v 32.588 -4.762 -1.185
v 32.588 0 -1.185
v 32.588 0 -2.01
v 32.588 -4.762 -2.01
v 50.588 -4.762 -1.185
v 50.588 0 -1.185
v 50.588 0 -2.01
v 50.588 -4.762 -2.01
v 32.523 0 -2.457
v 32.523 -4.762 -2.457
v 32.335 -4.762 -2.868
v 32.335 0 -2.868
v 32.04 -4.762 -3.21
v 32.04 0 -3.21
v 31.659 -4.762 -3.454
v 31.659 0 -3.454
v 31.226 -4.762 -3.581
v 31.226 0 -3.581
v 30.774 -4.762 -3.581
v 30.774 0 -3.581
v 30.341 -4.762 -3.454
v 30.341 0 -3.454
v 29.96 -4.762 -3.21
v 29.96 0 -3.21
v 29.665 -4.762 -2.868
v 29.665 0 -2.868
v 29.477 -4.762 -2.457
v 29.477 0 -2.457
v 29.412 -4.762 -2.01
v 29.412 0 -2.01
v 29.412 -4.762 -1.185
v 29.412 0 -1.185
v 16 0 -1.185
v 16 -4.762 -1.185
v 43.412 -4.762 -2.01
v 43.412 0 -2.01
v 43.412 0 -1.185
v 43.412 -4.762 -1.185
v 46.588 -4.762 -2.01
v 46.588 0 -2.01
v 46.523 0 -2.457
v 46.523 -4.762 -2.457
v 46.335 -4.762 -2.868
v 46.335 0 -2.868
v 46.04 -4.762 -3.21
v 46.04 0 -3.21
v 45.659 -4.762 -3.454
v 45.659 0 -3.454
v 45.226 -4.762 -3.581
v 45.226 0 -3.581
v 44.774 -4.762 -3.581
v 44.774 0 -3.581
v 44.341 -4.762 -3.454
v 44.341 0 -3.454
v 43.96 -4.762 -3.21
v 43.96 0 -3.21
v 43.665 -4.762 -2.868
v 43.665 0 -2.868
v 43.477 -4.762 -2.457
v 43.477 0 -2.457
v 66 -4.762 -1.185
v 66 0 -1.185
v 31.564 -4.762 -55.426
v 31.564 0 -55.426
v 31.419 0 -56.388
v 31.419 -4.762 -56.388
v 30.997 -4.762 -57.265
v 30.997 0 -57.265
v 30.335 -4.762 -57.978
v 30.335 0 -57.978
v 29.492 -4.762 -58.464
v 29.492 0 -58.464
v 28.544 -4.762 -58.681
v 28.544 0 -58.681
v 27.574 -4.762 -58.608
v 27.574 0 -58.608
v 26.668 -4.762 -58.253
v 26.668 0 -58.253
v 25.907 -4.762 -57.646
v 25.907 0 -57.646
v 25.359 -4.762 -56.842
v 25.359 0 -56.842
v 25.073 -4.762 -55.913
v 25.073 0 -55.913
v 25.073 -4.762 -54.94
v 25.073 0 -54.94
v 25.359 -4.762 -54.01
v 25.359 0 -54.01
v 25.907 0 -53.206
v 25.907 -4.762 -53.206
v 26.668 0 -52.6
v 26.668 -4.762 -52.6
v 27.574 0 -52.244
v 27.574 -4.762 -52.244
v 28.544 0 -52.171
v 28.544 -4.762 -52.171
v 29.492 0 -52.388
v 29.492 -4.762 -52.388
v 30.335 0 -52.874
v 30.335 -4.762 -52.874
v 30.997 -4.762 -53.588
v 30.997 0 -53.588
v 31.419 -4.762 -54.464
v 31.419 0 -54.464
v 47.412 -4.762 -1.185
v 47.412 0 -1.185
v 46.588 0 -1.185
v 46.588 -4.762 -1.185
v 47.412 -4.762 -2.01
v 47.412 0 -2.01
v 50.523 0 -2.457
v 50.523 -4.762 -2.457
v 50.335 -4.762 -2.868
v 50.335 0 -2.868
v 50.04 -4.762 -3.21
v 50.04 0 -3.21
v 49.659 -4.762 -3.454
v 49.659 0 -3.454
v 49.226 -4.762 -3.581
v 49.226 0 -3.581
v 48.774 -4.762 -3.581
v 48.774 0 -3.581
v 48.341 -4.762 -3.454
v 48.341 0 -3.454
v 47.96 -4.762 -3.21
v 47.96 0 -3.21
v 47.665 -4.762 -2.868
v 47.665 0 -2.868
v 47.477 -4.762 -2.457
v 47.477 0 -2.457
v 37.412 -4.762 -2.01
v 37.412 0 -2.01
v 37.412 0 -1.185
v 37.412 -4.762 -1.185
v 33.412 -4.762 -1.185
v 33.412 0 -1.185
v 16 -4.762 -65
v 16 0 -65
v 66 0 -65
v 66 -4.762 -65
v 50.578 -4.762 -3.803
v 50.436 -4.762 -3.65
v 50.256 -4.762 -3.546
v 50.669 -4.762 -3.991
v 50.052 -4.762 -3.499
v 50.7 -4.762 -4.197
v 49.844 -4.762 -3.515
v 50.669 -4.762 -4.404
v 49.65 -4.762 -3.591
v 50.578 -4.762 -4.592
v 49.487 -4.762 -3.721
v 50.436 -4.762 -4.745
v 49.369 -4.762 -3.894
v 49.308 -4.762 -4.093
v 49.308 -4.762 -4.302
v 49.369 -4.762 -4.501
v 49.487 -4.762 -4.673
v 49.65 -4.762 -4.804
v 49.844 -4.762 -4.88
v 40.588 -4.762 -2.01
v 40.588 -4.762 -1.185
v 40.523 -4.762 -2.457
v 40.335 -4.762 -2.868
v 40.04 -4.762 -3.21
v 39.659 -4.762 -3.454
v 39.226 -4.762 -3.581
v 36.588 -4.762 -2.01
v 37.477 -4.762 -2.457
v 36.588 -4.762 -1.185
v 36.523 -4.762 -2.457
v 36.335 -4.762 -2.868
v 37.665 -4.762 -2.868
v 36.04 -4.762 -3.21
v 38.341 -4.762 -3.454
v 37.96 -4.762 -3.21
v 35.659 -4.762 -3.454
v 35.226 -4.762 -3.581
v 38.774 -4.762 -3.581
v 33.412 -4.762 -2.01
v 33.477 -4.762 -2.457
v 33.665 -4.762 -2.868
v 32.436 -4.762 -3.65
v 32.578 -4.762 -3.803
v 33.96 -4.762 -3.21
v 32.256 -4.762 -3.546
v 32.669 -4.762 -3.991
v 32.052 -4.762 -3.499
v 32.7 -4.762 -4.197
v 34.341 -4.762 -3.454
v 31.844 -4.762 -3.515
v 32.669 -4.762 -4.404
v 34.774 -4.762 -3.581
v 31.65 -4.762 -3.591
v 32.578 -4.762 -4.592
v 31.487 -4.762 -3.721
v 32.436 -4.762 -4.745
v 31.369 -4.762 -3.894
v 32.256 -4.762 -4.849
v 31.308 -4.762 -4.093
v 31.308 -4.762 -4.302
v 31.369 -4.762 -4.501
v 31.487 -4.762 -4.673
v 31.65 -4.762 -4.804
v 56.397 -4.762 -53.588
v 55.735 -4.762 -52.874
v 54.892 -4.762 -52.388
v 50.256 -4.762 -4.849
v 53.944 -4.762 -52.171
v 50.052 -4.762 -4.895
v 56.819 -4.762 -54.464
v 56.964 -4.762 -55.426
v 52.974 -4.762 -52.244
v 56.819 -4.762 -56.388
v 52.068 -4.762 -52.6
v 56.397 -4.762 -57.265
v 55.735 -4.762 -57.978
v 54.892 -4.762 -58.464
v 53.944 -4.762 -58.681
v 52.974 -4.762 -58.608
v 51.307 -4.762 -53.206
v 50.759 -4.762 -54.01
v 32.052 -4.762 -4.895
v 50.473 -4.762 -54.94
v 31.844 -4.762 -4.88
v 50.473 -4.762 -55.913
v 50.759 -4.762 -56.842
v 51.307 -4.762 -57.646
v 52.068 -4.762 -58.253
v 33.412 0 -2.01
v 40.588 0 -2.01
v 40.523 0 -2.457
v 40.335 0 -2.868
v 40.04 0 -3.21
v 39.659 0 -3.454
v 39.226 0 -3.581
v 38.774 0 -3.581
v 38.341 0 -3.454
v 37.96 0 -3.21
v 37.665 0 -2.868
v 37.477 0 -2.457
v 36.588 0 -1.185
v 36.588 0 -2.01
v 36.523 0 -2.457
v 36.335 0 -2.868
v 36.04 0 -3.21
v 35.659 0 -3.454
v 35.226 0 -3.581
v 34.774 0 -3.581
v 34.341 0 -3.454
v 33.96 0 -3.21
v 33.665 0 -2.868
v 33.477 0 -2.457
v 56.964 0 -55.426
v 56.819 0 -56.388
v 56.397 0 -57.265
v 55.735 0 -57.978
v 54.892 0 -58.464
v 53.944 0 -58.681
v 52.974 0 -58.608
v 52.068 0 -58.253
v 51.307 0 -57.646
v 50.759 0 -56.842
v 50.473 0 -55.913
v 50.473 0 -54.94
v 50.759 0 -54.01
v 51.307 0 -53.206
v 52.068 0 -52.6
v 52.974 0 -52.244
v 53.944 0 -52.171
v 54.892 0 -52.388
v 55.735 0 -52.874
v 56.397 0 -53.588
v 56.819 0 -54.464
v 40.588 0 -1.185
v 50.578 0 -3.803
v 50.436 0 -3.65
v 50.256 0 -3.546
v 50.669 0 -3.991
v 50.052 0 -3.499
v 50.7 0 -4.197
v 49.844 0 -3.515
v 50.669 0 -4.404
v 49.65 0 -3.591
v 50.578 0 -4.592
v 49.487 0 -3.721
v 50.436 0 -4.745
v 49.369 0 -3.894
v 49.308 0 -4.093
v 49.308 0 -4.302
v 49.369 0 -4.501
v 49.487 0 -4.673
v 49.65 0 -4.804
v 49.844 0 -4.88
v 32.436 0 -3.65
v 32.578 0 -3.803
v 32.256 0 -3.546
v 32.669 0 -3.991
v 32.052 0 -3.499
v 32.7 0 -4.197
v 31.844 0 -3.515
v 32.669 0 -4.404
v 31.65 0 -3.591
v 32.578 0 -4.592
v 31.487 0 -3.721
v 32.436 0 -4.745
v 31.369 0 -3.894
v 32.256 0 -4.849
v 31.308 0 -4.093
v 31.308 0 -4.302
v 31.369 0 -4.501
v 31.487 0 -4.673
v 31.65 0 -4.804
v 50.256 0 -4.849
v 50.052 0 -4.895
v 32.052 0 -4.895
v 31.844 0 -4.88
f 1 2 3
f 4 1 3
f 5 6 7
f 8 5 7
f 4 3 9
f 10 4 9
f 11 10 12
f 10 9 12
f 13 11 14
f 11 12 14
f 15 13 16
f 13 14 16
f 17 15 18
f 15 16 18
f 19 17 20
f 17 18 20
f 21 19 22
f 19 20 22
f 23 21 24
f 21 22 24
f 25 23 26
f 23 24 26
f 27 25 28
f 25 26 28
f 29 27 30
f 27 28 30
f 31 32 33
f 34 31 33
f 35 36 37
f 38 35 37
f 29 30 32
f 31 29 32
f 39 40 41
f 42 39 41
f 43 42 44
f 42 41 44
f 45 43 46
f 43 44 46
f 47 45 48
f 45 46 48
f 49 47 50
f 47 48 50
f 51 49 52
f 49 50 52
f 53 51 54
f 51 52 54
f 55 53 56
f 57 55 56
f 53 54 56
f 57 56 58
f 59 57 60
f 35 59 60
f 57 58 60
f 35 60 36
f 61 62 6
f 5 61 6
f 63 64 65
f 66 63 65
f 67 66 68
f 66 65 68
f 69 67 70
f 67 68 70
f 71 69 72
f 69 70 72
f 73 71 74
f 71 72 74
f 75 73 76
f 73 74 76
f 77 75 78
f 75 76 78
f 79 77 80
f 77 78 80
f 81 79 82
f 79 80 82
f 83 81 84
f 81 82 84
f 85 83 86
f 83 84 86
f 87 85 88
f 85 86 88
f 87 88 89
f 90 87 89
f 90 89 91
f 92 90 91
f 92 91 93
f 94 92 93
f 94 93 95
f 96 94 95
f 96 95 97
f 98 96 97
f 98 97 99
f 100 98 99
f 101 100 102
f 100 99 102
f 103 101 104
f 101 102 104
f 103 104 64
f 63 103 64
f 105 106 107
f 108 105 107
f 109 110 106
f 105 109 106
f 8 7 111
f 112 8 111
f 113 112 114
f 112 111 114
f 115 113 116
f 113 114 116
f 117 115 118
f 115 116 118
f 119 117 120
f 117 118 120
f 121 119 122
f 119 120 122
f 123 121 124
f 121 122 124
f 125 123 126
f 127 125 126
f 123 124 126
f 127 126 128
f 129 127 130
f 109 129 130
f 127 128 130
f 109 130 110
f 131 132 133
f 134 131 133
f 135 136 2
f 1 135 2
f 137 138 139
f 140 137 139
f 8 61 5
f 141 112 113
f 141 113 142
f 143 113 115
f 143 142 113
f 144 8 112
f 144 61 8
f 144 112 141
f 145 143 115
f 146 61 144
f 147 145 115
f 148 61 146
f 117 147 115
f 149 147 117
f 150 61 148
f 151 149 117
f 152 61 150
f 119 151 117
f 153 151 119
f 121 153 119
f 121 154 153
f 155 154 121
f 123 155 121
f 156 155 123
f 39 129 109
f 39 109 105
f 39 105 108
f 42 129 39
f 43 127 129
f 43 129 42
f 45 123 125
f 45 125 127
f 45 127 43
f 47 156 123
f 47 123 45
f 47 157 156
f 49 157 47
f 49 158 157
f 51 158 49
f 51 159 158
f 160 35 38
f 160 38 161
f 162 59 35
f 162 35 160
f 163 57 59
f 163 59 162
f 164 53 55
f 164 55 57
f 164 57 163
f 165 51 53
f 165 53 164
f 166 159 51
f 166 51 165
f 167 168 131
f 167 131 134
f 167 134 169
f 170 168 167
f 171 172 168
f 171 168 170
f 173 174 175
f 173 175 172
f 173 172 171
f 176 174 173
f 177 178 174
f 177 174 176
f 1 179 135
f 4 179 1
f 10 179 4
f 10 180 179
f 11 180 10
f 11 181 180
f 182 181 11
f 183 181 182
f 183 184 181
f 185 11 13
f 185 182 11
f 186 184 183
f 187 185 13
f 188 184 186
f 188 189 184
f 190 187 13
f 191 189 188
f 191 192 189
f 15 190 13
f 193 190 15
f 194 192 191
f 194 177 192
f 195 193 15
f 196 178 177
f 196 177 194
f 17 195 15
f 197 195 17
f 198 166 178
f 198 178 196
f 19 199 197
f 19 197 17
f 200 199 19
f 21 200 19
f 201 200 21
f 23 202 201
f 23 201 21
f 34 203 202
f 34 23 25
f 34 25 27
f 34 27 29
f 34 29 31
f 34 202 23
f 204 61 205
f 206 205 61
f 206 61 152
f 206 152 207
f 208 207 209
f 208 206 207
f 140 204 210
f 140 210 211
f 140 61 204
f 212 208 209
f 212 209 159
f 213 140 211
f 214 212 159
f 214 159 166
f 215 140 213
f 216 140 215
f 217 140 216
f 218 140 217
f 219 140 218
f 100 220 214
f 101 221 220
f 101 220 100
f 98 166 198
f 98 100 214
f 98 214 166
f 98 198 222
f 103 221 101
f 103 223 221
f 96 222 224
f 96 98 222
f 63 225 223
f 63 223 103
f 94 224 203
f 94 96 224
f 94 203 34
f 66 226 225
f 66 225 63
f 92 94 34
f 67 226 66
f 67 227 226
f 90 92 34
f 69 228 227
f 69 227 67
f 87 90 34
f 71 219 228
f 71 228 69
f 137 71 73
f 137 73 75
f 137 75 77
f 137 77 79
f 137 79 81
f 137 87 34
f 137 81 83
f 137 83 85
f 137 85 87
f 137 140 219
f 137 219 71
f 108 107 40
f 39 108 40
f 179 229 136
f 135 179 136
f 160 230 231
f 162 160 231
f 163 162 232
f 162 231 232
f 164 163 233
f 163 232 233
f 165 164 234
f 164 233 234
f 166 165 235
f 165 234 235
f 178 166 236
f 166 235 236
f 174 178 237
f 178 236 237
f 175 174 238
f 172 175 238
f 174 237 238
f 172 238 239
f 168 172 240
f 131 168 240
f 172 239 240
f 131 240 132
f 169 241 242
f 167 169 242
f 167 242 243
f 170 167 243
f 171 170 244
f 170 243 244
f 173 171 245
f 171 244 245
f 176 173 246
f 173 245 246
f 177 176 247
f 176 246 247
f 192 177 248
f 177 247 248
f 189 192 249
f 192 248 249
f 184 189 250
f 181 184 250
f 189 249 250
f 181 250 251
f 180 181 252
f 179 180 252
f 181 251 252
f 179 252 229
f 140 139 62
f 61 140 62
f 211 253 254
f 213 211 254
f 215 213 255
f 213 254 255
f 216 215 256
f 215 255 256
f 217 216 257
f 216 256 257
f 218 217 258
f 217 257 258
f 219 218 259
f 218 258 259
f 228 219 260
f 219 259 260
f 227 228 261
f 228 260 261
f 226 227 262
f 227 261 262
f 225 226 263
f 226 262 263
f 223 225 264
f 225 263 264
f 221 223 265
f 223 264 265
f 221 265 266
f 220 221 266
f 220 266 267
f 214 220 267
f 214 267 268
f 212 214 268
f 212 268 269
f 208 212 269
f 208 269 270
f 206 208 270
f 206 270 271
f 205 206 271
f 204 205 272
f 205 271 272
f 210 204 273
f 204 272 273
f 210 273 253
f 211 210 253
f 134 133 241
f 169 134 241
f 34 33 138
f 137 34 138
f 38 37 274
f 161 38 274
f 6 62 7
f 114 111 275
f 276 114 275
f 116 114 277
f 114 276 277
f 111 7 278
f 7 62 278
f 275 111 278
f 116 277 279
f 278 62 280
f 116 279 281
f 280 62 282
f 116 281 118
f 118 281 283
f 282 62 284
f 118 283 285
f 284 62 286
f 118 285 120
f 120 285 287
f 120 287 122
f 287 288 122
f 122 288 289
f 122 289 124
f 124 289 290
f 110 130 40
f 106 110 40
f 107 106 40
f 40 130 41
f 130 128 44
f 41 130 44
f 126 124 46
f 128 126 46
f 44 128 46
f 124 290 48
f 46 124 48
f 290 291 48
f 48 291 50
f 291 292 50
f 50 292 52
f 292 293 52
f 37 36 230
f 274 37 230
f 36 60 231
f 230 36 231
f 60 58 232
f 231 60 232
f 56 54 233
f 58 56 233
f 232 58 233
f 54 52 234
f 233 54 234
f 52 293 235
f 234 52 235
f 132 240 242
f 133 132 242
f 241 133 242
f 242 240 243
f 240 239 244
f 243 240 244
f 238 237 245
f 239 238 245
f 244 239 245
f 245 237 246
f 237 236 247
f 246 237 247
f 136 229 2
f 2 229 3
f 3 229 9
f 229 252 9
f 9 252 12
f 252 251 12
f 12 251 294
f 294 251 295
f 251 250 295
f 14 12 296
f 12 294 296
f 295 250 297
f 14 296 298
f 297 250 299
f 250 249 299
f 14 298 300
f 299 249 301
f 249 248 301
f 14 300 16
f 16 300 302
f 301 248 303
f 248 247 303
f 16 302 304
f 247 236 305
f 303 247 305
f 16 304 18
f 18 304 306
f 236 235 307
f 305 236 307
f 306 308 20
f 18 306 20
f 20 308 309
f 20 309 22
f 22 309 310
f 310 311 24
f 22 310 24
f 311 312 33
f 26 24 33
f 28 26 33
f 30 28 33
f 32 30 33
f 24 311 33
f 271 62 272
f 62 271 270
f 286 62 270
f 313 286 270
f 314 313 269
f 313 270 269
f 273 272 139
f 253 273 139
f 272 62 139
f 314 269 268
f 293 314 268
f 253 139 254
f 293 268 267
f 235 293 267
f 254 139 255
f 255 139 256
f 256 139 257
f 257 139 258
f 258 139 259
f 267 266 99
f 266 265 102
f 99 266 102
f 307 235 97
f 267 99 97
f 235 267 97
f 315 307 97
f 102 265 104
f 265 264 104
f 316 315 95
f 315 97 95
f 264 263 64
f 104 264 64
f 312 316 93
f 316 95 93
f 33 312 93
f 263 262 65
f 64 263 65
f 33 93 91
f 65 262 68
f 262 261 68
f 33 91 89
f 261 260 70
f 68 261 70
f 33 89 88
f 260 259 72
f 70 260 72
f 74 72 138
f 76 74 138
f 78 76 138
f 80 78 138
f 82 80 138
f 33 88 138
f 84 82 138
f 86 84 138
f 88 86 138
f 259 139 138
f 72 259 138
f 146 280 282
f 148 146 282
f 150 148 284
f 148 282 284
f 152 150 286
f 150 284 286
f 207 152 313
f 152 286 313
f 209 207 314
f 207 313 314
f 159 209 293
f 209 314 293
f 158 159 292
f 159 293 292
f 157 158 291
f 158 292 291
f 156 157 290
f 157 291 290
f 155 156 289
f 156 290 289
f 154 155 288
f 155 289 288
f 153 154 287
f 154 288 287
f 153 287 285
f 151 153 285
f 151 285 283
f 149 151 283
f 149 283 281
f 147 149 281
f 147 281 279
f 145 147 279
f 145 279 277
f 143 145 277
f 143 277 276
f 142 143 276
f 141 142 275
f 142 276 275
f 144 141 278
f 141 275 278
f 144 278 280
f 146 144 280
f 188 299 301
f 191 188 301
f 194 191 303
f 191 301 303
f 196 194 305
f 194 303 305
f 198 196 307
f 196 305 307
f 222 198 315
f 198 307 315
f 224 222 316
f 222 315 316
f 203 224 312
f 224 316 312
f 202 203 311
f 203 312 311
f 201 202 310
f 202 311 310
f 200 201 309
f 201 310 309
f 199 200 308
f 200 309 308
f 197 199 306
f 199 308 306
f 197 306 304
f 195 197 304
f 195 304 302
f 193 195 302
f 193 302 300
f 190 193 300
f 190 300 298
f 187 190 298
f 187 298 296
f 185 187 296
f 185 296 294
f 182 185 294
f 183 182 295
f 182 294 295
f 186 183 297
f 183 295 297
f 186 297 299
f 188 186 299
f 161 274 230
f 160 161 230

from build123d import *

# Parameters (mm, degrees)
SKETCH1_R           = 0.7
SKETCH1_R_2         = 3.2639
BOSS_EXTRUDE1_DEPTH = 4.7625


with BuildPart() as part:
    # Sketch1 → Boss-Extrude1 (new body)
    with BuildSketch(Plane(origin=(0, 0, 0), x_dir=(1, 0, 0), z_dir=(0, 1, 0))):
        with BuildLine():
            Line((16, 1.185131266), (16, 65))
            Line((16, 65), (66, 65))
            Line((66, 65), (66, 1.185131266))
            Line((66, 1.185131266), (50.5875, 1.185131266))
            Line((50.5875, 1.185131266), (50.5875, 2.009827459))
            ThreePointArc((50.5875, 2.009827459), (49, 3.597327459), (47.4125, 2.009827459))
            Line((47.4125, 2.009827459), (47.4125, 1.185131266))
            Line((47.4125, 1.185131266), (46.5875, 1.185131266))
            Line((46.5875, 1.185131266), (46.5875, 2.009827459))
            ThreePointArc((46.5875, 2.009827459), (45, 3.597327459), (43.4125, 2.009827459))
            Line((43.4125, 2.009827459), (43.4125, 1.185131266))
            Line((43.4125, 1.185131266), (40.5875, 1.185131266))
            Line((40.5875, 1.185131266), (40.5875, 2.009827459))
            ThreePointArc((40.5875, 2.009827459), (39, 3.597327459), (37.4125, 2.009827459))
            Line((37.4125, 2.009827459), (37.4125, 1.185131266))
            Line((37.4125, 1.185131266), (36.5875, 1.185131266))
            Line((36.5875, 1.185131266), (36.5875, 2.009827459))
            ThreePointArc((36.5875, 2.009827459), (35, 3.597327459), (33.4125, 2.009827459))
            Line((33.4125, 2.009827459), (33.4125, 1.185131266))
            Line((33.4125, 1.185131266), (32.5875, 1.185131266))
            Line((32.5875, 1.185131266), (32.5875, 2.009827459))
            ThreePointArc((32.5875, 2.009827459), (31, 3.597327459), (29.4125, 2.009827459))
            Line((29.4125, 2.009827459), (29.4125, 1.185131266))
            Line((29.4125, 1.185131266), (16, 1.185131266))
        make_face()
        with Locations((32, 4.197327459)):
            Circle(SKETCH1_R, mode=Mode.SUBTRACT)
        with Locations((53.7, 55.426122104)):
            Circle(SKETCH1_R_2, mode=Mode.SUBTRACT)
        with Locations((28.3, 55.426122104)):
            Circle(SKETCH1_R_2, mode=Mode.SUBTRACT)
        with Locations((50, 4.197327459)):
            Circle(SKETCH1_R, mode=Mode.SUBTRACT)
    extrude(amount=-BOSS_EXTRUDE1_DEPTH)


solid = part.part
